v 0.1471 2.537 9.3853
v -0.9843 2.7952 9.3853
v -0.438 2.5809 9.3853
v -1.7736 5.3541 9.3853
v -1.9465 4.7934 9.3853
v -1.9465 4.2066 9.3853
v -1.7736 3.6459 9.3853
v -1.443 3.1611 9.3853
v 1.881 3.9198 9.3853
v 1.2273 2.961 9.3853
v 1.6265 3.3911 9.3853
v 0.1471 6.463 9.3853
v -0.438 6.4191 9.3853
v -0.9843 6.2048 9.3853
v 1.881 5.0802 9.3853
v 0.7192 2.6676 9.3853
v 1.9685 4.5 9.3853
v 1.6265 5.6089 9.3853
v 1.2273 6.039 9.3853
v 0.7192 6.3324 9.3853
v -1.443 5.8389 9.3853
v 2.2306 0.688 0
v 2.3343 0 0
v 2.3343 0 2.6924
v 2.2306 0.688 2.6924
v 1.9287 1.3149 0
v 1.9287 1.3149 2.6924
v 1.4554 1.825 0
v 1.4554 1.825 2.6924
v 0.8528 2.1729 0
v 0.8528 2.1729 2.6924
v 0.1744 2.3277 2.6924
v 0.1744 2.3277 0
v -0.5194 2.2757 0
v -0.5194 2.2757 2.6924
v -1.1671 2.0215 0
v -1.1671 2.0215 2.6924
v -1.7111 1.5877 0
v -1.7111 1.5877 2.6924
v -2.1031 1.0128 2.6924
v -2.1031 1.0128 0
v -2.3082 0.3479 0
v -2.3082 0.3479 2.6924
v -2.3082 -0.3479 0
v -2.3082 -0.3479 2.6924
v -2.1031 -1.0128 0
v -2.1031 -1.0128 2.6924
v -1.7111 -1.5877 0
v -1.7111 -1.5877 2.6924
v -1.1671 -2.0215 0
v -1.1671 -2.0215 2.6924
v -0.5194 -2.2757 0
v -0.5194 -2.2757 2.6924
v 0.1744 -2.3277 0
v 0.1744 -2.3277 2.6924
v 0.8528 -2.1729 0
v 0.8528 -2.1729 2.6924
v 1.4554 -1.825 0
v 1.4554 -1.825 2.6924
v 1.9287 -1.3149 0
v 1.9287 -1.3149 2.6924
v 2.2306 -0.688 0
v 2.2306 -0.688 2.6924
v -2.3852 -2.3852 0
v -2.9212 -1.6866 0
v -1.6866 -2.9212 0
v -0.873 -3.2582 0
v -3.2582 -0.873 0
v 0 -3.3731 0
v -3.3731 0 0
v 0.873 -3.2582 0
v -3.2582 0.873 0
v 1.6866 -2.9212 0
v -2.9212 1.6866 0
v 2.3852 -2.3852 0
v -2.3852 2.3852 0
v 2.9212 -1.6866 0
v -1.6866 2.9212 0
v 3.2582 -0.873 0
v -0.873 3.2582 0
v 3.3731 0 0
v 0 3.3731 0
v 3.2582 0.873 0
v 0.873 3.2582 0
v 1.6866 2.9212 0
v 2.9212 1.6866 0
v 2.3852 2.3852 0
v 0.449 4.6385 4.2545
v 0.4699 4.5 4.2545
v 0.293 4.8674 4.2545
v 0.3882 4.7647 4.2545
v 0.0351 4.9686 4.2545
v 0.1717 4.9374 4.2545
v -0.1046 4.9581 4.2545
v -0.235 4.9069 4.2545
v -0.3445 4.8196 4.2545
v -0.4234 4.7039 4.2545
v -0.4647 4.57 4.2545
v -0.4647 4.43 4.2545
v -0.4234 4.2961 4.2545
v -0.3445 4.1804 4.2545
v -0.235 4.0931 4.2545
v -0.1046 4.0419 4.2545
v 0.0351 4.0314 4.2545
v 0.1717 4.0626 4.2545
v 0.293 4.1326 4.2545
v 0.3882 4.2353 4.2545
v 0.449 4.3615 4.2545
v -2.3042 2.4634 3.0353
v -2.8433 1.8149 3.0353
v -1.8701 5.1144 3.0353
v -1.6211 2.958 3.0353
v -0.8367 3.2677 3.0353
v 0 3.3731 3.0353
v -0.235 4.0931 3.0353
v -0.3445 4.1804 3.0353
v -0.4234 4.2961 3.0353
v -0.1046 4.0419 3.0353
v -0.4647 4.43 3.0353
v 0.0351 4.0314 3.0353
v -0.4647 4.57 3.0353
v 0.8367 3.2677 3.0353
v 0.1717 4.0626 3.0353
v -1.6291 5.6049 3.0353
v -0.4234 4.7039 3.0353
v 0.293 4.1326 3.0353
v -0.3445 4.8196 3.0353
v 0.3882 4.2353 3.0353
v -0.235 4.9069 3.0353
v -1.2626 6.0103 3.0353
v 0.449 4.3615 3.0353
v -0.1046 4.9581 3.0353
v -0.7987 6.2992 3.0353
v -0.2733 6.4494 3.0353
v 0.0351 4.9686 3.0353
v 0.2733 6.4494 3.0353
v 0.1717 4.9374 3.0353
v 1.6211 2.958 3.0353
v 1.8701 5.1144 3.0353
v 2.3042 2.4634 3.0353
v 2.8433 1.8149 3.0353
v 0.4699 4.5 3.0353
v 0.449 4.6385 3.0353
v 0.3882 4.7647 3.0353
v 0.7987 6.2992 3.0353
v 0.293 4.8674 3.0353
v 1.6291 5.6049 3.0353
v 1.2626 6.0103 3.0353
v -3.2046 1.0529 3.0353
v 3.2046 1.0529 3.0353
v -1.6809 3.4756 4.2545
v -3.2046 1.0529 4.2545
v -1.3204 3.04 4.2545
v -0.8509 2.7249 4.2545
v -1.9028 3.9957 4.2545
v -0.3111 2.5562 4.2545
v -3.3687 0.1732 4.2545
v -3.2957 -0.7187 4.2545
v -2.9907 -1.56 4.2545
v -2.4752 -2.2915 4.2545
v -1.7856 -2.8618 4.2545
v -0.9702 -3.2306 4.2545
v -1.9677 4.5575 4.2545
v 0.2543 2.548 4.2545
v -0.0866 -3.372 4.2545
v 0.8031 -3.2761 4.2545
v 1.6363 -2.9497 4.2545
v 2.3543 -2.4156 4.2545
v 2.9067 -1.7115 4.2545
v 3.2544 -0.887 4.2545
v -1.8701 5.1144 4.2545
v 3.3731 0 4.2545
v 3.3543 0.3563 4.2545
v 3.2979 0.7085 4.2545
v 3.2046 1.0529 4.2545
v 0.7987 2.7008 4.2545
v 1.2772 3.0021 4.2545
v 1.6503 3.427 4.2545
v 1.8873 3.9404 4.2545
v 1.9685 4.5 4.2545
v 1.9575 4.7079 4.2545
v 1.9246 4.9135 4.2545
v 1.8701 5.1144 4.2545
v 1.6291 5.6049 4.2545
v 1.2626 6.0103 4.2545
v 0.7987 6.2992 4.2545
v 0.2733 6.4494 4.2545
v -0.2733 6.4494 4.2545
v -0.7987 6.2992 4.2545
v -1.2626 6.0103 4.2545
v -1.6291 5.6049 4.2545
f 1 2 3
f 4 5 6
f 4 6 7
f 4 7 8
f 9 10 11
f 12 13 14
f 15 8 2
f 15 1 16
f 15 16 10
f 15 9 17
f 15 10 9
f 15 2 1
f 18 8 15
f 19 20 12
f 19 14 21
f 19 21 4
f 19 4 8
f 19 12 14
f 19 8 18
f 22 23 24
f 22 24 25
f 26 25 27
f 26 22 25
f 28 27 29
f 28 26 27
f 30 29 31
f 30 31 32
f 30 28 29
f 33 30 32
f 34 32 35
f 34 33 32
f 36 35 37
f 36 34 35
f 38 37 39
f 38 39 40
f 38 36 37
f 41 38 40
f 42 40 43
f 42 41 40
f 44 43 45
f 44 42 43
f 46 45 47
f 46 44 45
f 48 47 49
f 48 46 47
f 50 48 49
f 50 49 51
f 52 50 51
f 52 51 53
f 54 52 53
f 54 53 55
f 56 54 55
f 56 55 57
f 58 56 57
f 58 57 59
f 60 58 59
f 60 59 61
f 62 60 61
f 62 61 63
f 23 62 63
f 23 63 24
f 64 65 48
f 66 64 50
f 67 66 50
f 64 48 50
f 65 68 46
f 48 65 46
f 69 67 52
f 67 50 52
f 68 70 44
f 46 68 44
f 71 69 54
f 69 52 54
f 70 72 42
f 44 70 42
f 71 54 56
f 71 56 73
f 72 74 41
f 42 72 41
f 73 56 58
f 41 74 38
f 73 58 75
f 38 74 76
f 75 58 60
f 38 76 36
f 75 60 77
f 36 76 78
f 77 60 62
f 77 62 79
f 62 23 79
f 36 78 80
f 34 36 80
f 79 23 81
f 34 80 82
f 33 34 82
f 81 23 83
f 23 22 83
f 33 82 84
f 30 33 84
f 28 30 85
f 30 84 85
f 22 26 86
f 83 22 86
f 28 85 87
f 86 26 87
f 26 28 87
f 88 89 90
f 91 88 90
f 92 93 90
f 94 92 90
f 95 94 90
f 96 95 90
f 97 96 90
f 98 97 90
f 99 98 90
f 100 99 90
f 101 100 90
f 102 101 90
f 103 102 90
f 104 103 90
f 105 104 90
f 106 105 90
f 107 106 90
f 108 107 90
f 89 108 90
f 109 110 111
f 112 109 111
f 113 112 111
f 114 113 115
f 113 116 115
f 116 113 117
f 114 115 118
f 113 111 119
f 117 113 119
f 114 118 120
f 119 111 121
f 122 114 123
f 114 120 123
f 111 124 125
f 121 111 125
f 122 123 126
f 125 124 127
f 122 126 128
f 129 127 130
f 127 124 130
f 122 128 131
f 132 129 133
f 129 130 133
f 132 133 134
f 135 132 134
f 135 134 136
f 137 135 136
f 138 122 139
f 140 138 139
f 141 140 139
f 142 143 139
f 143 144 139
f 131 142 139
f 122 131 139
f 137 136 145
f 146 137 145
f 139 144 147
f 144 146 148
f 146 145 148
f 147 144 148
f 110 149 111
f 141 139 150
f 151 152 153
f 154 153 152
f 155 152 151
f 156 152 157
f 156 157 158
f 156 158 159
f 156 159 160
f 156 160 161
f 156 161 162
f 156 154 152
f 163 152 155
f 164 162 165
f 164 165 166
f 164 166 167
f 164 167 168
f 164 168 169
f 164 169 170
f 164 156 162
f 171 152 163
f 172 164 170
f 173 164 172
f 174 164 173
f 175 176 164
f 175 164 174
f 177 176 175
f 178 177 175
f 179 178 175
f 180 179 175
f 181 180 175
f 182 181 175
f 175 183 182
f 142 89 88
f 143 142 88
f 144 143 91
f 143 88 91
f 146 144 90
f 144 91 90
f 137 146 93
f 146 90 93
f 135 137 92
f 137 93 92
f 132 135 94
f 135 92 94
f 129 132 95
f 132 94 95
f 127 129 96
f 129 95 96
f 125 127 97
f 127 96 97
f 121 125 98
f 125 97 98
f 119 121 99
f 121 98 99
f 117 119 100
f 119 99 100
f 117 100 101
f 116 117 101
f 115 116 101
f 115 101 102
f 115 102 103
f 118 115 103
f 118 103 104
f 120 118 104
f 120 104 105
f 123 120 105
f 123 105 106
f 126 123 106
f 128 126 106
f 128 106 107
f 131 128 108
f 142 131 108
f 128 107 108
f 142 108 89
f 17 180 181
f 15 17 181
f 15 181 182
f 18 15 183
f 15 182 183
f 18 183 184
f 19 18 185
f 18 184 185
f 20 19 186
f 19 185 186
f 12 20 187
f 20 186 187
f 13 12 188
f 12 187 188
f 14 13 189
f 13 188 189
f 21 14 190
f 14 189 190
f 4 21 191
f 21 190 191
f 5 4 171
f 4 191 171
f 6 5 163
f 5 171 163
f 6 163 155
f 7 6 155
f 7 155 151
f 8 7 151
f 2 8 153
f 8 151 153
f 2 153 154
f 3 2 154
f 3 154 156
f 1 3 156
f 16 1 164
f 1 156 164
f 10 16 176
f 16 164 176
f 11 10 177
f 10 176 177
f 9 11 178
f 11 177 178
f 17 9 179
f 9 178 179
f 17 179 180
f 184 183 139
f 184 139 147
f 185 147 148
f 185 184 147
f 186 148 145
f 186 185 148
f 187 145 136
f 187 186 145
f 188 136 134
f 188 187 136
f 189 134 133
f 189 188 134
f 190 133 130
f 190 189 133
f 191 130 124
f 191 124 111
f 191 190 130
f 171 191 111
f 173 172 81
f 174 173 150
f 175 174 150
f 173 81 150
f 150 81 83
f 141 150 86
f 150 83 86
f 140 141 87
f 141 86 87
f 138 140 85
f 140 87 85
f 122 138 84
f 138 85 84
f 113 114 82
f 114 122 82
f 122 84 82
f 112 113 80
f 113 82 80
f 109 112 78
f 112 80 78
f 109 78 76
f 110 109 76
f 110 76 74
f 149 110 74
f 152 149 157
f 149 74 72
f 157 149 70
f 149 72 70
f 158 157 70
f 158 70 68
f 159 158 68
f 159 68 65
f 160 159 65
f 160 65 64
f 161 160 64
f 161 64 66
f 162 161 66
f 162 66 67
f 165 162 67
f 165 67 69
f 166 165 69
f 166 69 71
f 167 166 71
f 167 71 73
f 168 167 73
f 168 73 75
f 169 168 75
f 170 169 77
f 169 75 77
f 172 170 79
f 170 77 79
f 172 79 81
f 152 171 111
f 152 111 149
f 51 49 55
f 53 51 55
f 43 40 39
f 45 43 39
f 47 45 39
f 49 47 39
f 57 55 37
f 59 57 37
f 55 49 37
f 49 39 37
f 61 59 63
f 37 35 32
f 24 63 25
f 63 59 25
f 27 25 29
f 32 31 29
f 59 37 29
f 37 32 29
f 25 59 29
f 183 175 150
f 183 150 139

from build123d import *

# Parameters (mm, degrees)
SKETCH1_R           = 3.37312
SKETCH1_R_2         = 2.33426
BOSS_EXTRUDE1_DEPTH = 4.2545
SKETCH2_R           = 0.4699
BOSS_EXTRUDE2_DEPTH = 1.2192
SKETCH3_R           = 2.33426
BOSS_EXTRUDE3_DEPTH = 1.5621
SKETCH4_R           = 1.9685
BOSS_EXTRUDE5_DEPTH = 5.1308


with BuildPart() as part:
    # Sketch1 → Boss-Extrude1 (new body)
    with BuildSketch(Plane.XY):
        Circle(SKETCH1_R)
        Circle(SKETCH1_R_2, mode=Mode.SUBTRACT)
    extrude(amount=BOSS_EXTRUDE1_DEPTH)

    # Sketch2 → Boss-Extrude2 (add)
    with BuildSketch(Plane.XY.offset(4.2545)):
        with BuildLine():
            ThreePointArc((1.87014753, 5.114443216), (0, 6.4685), (-1.87014753, 5.114443216))
            Line((-1.87014753, 5.114443216), (-3.204588284, 1.052878181))
            ThreePointArc((-3.204588284, 1.052878181), (0, 3.37312), (3.204588284, 1.052878181))
            Line((3.204588284, 1.052878181), (1.87014753, 5.114443216))
        make_face()
        with Locations((0, 4.5)):
            Circle(SKETCH2_R, mode=Mode.SUBTRACT)
    extrude(amount=-BOSS_EXTRUDE2_DEPTH)

    # Sketch3 → Boss-Extrude3 (add)
    with BuildSketch(Plane.XY.offset(4.2545)):
        Circle(SKETCH3_R)
    extrude(amount=-BOSS_EXTRUDE3_DEPTH)

    # Sketch4 → Boss-Extrude5 (add)
    with BuildSketch(Plane.XY.offset(4.2545)):
        with Locations((0, 4.5)):
            Circle(SKETCH4_R)
    extrude(amount=BOSS_EXTRUDE5_DEPTH)


solid = part.part
